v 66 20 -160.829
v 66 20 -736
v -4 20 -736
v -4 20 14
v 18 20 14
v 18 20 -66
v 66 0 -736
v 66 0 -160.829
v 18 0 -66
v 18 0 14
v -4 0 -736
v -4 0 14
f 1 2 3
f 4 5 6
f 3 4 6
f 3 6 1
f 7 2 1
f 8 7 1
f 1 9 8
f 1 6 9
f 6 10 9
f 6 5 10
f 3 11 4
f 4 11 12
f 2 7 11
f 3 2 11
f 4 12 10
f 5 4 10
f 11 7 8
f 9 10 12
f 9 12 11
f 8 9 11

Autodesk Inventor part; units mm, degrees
ref_plane "YZ Plane" through (0, 0, 0) normal (1, 0, 0) x (0, 1, 0)
ref_plane "XZ Plane" through (0, 0, 0) normal (0, 1, 0) x (-1, 0, 0)
ref_plane "XY Plane" through (0, 0, 0) normal (0, 0, 1) x (1, 0, 0)
sketch "Sketch1" plane through (0, 0, 0) normal (0, 1, 0) x (-1, 0, 0)
  line L0 (4, 14) -> (-86, 14)
  line L1 (-86, 14) -> (-86, -736)
  line L2 (-86, -736) -> (4, -736)
  line L3 (4, -736) -> (4, 14)
  point P0 (0, 0)
  dimension "d0" = 750
  dimension "d1" = 90
extrude "Extrusion1" add sketch "Sketch1" along normal blind 20
sketch "Sketch2" plane through (0, 20, 0) normal (0, 1, 0) x (1, 0, 0)
  line L0 (100, -14) -> (18, -14)
  line L1 (18, -14) -> (18, 66)
  line L2 (18, 66) -> (100, 66)
  line L3 (100, 66) -> (100, -14)
  line L4 (18, 66) -> (100, 228)
  line L5 (100, 228) -> (100, 66)
  line L6 (18, -14) -> (27, -14)
  line L7 (27, -14) -> (27, -14)
  line L8 (-4, -14) -> (86, -14) projected
  point P0 (0, 0)
  dimension "d10" = 0
  dimension "d11" = 80
  dimension "d13" = 82
  dimension "d14" = 82
  dimension "d15" = 162
  dimension "d16" = 162
  dimension "d17" = 9
  dimension "d18" = 0
  dimension "d19" = 22
  dimension "d20" = 0
extrude "Extrusion2" cut sketch "Sketch2" against normal blind 25
sketch "Sketch3" plane through (0, 20, 0) normal (0, 1, 0) x (1, 0, 0)
  line L0 (86, 736) -> (-4, 736) projected
  line L1 (86, 736) -> (66, 736)
  line L2 (66, 736) -> (66, -31)
  line L3 (66, -31) -> (86, -31)
  line L4 (86, -31) -> (86, 736)
  line L5 (-4, 736) -> (-4, -14) projected
  point P0 (0, 0)
  dimension "d7" = 70
extrude "Extrusion3" cut sketch "Sketch3" against normal blind 30
properties part number "YflanecYcrepA" material "Aluminum 6061"
